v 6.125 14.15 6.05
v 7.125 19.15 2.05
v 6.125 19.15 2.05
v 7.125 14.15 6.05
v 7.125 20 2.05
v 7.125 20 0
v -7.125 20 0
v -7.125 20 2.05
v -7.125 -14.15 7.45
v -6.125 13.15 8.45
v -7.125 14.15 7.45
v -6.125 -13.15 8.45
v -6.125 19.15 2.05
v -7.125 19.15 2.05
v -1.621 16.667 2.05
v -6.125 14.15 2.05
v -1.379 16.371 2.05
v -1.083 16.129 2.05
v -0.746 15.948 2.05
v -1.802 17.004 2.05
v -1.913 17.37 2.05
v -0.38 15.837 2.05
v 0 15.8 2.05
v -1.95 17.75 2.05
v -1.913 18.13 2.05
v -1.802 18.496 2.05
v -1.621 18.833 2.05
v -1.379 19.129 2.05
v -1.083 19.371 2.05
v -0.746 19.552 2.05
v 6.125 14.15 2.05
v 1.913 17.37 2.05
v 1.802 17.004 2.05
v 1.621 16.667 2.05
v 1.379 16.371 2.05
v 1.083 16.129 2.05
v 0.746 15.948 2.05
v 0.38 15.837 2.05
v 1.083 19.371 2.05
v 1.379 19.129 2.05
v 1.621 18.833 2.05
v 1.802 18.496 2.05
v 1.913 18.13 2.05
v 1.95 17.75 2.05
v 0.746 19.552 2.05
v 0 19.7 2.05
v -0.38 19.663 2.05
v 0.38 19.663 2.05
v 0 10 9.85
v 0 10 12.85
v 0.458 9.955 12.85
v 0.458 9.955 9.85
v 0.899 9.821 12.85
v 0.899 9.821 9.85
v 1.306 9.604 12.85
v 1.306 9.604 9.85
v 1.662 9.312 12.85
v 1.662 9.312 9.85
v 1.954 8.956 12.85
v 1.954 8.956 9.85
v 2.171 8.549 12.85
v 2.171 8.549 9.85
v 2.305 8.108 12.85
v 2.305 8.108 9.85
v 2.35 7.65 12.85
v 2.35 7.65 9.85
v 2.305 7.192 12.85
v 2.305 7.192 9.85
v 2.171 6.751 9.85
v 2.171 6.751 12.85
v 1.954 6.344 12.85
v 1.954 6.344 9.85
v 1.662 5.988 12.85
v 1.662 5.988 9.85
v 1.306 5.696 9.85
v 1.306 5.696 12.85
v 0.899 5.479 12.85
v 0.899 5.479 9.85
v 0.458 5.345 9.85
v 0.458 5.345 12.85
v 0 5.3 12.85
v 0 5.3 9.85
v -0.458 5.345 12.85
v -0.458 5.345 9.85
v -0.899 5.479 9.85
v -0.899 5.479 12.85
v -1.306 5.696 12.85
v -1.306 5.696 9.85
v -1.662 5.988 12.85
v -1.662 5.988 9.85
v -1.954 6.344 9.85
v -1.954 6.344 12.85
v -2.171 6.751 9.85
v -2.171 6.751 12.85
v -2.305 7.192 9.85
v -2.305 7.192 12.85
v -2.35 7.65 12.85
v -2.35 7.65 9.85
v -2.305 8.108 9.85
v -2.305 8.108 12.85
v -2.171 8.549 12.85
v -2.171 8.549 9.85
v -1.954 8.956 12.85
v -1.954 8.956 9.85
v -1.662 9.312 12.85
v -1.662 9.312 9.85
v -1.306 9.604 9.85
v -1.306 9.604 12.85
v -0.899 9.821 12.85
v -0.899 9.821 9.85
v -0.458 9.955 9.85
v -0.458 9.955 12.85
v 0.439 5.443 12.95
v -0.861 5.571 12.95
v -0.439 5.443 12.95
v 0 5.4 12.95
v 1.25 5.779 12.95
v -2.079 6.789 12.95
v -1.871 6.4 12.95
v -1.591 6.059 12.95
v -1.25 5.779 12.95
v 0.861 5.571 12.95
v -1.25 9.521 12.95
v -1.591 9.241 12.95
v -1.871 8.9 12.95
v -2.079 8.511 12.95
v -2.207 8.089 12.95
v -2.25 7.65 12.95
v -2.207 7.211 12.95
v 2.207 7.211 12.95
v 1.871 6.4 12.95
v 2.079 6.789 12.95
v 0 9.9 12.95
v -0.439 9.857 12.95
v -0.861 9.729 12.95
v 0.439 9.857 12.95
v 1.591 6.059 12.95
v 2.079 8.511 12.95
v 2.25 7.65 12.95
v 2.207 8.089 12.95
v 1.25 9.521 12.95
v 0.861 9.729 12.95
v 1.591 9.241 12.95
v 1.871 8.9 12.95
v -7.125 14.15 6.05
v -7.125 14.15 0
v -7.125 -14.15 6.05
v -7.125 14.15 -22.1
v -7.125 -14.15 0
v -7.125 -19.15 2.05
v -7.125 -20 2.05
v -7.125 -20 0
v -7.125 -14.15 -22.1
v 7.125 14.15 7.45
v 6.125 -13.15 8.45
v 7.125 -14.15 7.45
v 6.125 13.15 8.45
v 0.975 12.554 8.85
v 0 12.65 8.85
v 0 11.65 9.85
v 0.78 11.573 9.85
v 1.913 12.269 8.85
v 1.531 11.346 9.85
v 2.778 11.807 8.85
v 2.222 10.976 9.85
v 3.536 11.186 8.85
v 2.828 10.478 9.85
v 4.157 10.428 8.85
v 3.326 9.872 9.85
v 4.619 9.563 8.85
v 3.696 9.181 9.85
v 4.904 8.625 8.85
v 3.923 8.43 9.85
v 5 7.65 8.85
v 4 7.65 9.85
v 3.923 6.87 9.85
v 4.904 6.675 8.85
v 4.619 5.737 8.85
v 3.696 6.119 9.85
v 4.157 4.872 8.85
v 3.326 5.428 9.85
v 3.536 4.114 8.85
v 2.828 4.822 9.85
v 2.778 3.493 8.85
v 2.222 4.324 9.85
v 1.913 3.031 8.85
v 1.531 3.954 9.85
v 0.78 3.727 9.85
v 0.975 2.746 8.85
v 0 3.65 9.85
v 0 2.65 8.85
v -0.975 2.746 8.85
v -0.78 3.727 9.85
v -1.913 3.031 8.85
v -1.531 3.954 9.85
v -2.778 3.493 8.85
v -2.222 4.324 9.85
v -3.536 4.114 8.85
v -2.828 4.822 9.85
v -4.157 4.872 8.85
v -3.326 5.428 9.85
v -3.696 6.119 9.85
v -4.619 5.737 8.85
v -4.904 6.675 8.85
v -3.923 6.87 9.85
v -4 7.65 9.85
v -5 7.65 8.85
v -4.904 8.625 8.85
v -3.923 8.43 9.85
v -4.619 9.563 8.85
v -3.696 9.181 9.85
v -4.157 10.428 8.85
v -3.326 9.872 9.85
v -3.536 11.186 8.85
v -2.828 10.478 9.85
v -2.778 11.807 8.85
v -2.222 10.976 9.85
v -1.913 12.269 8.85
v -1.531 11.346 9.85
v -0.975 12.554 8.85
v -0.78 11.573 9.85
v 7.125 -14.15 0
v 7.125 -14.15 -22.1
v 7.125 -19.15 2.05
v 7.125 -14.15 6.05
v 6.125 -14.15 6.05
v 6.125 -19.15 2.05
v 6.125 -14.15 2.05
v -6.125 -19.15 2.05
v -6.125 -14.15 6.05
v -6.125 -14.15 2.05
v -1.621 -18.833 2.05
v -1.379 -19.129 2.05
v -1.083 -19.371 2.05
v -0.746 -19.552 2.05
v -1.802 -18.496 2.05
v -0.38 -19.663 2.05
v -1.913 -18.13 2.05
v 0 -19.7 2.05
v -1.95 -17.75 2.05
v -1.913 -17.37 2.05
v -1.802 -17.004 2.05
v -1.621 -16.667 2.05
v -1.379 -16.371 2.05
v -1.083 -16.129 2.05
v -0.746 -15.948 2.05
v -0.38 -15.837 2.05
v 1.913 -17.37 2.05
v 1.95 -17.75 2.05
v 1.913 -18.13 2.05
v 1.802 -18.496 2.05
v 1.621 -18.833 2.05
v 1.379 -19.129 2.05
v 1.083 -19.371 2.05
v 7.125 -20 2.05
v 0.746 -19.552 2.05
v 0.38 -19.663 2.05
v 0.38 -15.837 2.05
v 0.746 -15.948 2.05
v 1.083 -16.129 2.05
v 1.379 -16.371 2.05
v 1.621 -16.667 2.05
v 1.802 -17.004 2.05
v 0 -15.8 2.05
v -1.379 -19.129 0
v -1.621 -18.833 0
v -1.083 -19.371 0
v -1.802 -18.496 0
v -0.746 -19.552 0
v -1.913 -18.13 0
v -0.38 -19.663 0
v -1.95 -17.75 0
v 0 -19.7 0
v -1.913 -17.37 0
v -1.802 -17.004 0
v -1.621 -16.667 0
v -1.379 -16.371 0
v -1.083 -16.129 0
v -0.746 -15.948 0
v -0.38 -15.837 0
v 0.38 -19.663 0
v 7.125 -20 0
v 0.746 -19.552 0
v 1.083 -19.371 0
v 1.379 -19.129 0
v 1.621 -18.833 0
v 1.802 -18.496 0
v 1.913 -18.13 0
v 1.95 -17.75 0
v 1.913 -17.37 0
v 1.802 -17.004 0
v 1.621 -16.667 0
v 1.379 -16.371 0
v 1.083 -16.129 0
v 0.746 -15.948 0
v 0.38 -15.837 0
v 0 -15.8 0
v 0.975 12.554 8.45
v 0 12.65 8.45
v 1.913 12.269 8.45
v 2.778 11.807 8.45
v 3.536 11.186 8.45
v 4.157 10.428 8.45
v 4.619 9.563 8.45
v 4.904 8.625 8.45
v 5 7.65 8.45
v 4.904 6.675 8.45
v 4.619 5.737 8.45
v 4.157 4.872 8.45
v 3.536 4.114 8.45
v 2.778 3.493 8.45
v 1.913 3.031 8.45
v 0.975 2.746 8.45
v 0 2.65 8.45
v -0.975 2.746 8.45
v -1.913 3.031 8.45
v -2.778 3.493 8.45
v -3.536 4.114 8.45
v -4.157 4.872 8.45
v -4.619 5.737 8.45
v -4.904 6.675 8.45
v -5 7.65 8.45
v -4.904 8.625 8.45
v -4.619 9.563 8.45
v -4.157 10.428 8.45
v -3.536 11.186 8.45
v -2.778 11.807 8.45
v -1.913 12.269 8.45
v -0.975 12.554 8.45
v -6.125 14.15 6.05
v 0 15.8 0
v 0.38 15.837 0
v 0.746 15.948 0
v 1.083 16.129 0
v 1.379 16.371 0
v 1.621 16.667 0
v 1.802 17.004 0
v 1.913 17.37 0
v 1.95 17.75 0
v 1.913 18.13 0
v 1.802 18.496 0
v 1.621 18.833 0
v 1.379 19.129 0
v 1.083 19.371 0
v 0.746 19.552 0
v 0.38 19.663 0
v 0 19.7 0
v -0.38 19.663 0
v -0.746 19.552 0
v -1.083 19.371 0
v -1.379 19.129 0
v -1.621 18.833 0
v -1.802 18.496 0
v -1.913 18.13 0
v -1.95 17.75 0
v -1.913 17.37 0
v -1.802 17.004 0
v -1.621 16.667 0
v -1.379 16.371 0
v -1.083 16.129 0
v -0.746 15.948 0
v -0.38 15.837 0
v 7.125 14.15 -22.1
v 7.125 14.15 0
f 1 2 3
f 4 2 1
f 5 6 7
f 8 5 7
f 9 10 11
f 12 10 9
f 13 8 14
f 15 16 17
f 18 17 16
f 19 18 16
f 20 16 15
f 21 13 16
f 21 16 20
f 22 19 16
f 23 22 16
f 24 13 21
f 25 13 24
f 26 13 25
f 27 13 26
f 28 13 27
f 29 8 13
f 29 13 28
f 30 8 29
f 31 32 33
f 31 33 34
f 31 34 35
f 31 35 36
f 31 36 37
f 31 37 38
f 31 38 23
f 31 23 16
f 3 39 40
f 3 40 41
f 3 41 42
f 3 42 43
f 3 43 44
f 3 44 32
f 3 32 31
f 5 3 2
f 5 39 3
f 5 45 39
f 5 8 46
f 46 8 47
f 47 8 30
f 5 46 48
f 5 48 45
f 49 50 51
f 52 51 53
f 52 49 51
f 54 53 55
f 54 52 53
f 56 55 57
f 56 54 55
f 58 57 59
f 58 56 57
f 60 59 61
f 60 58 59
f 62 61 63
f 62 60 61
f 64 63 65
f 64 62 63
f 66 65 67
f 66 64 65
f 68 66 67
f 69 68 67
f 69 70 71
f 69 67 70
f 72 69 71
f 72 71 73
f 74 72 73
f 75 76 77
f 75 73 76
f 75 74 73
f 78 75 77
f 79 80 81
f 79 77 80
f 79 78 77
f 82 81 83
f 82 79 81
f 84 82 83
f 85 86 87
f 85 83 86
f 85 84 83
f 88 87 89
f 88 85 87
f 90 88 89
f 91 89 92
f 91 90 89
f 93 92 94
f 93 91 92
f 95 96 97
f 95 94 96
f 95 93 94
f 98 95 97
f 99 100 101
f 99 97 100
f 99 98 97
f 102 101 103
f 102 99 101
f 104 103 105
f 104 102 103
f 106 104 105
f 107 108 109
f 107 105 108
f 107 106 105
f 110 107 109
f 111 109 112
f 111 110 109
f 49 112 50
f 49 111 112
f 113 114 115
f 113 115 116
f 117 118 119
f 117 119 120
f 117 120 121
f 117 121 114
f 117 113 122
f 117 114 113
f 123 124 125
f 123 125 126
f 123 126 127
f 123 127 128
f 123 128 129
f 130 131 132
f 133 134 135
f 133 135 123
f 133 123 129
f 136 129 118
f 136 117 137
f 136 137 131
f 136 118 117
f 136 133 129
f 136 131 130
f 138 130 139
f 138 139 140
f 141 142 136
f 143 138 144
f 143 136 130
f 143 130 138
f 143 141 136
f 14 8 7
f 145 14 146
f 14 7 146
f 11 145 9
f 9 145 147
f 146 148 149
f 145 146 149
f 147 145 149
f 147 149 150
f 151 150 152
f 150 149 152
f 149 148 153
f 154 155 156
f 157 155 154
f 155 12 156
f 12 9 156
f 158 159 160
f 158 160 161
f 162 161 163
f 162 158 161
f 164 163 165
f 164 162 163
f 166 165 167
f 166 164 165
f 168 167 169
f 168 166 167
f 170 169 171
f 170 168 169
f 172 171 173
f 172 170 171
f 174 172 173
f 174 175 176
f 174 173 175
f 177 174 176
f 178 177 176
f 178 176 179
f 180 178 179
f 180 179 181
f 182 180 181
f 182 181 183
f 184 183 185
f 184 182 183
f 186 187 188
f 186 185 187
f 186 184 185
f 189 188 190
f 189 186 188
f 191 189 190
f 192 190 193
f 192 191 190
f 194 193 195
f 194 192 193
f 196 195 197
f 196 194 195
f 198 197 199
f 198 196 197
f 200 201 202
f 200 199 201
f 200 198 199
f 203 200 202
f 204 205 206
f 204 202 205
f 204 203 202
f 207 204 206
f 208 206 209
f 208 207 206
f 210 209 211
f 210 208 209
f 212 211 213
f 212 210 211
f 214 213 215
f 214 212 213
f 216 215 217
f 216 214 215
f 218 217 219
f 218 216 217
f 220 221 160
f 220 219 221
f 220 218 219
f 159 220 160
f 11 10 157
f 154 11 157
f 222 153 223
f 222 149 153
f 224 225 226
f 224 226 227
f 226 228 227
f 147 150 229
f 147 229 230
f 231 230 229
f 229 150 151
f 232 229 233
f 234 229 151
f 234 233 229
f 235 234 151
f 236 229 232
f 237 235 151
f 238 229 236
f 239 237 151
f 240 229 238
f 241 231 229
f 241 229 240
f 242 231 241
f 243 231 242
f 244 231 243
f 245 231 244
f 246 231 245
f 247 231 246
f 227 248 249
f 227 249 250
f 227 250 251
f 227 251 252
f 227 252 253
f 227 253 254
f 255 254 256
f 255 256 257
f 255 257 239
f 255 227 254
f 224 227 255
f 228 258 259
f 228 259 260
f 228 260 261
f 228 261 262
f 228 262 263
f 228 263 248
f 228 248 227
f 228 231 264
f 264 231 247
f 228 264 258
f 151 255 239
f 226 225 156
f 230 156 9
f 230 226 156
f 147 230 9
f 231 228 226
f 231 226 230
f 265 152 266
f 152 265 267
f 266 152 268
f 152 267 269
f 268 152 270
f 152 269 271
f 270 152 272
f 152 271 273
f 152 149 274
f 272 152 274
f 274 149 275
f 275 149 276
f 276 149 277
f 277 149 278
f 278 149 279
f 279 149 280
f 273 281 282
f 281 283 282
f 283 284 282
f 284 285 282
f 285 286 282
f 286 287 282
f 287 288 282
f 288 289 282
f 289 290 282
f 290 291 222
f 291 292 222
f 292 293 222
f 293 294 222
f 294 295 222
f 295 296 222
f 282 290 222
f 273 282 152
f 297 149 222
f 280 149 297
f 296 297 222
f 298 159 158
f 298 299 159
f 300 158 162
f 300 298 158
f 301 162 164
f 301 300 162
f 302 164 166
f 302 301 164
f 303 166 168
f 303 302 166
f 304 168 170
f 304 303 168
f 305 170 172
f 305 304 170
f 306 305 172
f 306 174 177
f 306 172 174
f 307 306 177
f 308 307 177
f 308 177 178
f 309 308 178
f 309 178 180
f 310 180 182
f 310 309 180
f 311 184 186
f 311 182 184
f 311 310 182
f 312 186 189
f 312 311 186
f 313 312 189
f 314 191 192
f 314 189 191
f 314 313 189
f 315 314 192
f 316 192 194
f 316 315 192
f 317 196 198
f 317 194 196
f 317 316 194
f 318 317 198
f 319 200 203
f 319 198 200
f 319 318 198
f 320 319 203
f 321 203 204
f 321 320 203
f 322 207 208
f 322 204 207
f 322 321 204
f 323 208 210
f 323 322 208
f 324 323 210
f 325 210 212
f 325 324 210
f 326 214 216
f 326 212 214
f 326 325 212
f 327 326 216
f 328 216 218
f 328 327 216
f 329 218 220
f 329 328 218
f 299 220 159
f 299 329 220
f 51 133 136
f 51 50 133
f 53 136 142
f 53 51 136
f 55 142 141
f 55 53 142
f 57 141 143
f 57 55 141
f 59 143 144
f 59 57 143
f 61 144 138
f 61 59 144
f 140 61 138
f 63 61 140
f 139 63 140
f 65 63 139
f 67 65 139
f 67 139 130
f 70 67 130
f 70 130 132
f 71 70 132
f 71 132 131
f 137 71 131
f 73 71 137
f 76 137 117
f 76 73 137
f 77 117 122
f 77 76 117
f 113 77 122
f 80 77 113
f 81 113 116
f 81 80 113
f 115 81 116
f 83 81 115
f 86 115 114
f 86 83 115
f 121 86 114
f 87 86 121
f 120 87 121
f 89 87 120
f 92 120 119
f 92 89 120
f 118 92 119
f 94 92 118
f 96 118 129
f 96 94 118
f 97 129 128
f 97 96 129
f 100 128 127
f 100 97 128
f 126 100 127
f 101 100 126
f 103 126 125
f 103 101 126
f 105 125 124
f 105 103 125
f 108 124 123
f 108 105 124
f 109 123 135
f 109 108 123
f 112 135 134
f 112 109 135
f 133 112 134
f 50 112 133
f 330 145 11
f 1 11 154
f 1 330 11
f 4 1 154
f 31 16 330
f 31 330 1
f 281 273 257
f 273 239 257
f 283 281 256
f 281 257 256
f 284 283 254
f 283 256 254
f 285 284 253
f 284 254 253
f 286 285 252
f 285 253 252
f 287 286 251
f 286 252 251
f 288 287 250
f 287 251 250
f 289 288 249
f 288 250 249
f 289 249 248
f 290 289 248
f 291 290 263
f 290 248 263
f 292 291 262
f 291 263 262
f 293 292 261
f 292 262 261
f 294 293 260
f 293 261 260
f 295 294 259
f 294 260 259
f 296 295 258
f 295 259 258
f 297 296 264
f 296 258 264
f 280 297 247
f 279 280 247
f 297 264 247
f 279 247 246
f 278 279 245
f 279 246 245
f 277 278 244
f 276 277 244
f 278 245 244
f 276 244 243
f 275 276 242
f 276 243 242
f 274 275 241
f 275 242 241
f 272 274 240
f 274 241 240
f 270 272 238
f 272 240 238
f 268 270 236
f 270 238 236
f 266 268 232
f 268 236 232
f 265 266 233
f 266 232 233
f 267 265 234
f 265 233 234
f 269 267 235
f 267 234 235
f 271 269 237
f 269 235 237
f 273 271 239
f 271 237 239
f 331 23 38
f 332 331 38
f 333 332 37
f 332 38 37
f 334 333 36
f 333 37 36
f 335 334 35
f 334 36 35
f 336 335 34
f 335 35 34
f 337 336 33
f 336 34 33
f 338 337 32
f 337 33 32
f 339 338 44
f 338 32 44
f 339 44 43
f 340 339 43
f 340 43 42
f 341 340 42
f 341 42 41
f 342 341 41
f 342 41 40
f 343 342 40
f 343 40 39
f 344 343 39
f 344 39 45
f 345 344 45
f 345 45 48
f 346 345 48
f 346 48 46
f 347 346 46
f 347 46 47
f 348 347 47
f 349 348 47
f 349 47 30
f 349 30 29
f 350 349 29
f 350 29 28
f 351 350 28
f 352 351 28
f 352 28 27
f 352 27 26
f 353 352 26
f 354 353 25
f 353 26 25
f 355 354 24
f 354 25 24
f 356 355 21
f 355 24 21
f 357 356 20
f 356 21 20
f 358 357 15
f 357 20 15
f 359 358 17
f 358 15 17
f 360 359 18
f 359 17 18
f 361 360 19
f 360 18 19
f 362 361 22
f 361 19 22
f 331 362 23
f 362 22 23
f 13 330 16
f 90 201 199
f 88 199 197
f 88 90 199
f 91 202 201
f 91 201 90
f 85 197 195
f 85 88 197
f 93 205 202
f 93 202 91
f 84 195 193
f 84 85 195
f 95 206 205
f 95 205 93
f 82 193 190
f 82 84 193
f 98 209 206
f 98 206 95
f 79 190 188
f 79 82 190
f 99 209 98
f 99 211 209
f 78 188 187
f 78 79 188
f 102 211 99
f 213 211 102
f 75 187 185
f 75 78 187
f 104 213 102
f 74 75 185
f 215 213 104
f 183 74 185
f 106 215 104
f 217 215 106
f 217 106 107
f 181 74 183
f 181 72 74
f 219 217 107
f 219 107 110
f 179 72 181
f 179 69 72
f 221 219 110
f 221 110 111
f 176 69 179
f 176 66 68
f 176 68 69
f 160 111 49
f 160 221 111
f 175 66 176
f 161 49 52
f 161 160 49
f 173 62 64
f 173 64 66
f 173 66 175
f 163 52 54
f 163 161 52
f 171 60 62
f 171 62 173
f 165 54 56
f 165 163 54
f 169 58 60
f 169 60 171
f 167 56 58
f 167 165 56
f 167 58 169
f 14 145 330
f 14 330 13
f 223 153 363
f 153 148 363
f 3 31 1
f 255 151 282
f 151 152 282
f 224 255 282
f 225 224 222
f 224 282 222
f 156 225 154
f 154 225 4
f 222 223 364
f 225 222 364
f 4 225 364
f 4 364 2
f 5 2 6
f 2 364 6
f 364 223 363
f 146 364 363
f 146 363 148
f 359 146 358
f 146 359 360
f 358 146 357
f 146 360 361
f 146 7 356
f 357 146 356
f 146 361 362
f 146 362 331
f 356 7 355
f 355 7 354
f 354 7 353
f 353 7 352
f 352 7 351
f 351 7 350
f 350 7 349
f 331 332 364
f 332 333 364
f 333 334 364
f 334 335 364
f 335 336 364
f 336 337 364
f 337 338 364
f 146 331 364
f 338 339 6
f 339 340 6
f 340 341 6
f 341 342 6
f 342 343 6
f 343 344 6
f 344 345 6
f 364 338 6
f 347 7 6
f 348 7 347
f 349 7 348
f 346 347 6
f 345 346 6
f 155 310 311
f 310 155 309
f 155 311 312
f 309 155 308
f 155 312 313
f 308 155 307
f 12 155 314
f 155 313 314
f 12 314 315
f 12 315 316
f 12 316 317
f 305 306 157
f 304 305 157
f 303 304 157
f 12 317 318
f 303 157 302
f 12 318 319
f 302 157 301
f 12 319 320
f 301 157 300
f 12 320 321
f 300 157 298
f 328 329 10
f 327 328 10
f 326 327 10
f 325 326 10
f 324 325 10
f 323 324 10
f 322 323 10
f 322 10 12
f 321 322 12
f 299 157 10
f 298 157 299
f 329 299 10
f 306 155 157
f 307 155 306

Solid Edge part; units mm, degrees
sketch "Sketch1" plane through (0, 0, 0) normal (0, 0, 1) x (1, 0, 0)
  line L0 (-7.125, -14.15) -> (7.125, -14.15)
  line L1 (7.125, -14.15) -> (7.125, 14.15)
  line L2 (7.125, 14.15) -> (-7.125, 14.15)
  line L3 (-7.125, 14.15) -> (-7.125, -14.15)
  dimension "D1" = 28.3
  dimension "D2" = 14.25
extrude "Protrusion1" add sketch "Sketch1" against normal blind 22.1
sketch "Sketch2" plane through (0, 0, 0) normal (0, 0, 1) x (1, 0, 0)
  line L0 (-7.125, -20) -> (7.125, -20)
  line L1 (7.125, -20) -> (7.125, 20)
  line L2 (7.125, 20) -> (-7.125, 20)
  line L3 (-7.125, 20) -> (-7.125, -20)
  dimension "D1" = 40
extrude "ExtrudedProtrusion_2" add sketch "Sketch2" along normal blind 2.05
sketch "Sketch3" plane through (0, 0, 2.05) normal (0, 0, 1) x (1, 0, 0)
  line L0 (7.125, -14.15) -> (-7.125, -14.15)
  line L1 (-7.125, -14.15) -> (-7.125, 14.15)
  line L2 (-7.125, 14.15) -> (7.125, 14.15)
  line L3 (7.125, 14.15) -> (7.125, -14.15)
extrude "ExtrudedProtrusion_3" add sketch "Sketch3" along normal blind 6.4
hole "Hole1" at (0, -17.75, 2.05) direction (0, 0, -1) diameter 3.9 end up to next
hole "Hole2" at (0, 17.75, 2.05) direction (0, 0, -1) diameter 3.9 end up to next
sketch "Sketch4" plane through (0, 0, 8.45) normal (0, 0, 1) x (0, 1, 0)
  circle A0 centre (7.65, 0) radius 2.35
  dimension "D1" = 6.5
  dimension "D2" = 4.7
extrude "ExtrudedProtrusion_4" add sketch "Sketch4" along normal blind 4.5
sketch "Sketch5" plane through (0, 0, 8.45) normal (0, 0, 1) x (0, 1, 0)
  circle A0 centre (7.65, 0) radius 5
  dimension "D1" = 10
extrude "ExtrudedProtrusion_5" add sketch "Sketch5" along normal blind 1.4
sketch "Sketch6" plane through (7.125, 0, -6.825) normal (1, 0, 0) x (0, 1, 0)
  line L0 (-14.15, 8.875) -> (-14.15, 12.875)
  line L1 (-14.15, 12.875) -> (-19.15, 8.875)
  line L2 (-19.15, 8.875) -> (-14.15, 8.875)
  line L3 (14.15, 8.875) -> (19.15, 8.875)
  line L4 (19.15, 8.875) -> (14.15, 12.875)
  line L5 (14.15, 12.875) -> (14.15, 8.875)
  dimension "D1" = 4
  dimension "D2" = 5
extrude "ExtrudedProtrusion_6" add sketch "Sketch6" against normal blind 1
mirror "Mirror1" about plane through (0, 0, 0) normal (1, 0, 0) of "ExtrudedProtrusion_6"
chamfer "Chamfer_1" distance 1 angle 45 4 edges at (-7.125, 0, 8.45) (0, -14.15, 8.45) (7.125, 0, 8.45) (0, 14.15, 8.45)
chamfer "Chamfer_2" distance 1 angle 45 1 edges at (0, 2.65, 9.85)
chamfer "Chamfer_3" distance 0.1 angle 45 1 edges at (0, 5.3, 12.95)
